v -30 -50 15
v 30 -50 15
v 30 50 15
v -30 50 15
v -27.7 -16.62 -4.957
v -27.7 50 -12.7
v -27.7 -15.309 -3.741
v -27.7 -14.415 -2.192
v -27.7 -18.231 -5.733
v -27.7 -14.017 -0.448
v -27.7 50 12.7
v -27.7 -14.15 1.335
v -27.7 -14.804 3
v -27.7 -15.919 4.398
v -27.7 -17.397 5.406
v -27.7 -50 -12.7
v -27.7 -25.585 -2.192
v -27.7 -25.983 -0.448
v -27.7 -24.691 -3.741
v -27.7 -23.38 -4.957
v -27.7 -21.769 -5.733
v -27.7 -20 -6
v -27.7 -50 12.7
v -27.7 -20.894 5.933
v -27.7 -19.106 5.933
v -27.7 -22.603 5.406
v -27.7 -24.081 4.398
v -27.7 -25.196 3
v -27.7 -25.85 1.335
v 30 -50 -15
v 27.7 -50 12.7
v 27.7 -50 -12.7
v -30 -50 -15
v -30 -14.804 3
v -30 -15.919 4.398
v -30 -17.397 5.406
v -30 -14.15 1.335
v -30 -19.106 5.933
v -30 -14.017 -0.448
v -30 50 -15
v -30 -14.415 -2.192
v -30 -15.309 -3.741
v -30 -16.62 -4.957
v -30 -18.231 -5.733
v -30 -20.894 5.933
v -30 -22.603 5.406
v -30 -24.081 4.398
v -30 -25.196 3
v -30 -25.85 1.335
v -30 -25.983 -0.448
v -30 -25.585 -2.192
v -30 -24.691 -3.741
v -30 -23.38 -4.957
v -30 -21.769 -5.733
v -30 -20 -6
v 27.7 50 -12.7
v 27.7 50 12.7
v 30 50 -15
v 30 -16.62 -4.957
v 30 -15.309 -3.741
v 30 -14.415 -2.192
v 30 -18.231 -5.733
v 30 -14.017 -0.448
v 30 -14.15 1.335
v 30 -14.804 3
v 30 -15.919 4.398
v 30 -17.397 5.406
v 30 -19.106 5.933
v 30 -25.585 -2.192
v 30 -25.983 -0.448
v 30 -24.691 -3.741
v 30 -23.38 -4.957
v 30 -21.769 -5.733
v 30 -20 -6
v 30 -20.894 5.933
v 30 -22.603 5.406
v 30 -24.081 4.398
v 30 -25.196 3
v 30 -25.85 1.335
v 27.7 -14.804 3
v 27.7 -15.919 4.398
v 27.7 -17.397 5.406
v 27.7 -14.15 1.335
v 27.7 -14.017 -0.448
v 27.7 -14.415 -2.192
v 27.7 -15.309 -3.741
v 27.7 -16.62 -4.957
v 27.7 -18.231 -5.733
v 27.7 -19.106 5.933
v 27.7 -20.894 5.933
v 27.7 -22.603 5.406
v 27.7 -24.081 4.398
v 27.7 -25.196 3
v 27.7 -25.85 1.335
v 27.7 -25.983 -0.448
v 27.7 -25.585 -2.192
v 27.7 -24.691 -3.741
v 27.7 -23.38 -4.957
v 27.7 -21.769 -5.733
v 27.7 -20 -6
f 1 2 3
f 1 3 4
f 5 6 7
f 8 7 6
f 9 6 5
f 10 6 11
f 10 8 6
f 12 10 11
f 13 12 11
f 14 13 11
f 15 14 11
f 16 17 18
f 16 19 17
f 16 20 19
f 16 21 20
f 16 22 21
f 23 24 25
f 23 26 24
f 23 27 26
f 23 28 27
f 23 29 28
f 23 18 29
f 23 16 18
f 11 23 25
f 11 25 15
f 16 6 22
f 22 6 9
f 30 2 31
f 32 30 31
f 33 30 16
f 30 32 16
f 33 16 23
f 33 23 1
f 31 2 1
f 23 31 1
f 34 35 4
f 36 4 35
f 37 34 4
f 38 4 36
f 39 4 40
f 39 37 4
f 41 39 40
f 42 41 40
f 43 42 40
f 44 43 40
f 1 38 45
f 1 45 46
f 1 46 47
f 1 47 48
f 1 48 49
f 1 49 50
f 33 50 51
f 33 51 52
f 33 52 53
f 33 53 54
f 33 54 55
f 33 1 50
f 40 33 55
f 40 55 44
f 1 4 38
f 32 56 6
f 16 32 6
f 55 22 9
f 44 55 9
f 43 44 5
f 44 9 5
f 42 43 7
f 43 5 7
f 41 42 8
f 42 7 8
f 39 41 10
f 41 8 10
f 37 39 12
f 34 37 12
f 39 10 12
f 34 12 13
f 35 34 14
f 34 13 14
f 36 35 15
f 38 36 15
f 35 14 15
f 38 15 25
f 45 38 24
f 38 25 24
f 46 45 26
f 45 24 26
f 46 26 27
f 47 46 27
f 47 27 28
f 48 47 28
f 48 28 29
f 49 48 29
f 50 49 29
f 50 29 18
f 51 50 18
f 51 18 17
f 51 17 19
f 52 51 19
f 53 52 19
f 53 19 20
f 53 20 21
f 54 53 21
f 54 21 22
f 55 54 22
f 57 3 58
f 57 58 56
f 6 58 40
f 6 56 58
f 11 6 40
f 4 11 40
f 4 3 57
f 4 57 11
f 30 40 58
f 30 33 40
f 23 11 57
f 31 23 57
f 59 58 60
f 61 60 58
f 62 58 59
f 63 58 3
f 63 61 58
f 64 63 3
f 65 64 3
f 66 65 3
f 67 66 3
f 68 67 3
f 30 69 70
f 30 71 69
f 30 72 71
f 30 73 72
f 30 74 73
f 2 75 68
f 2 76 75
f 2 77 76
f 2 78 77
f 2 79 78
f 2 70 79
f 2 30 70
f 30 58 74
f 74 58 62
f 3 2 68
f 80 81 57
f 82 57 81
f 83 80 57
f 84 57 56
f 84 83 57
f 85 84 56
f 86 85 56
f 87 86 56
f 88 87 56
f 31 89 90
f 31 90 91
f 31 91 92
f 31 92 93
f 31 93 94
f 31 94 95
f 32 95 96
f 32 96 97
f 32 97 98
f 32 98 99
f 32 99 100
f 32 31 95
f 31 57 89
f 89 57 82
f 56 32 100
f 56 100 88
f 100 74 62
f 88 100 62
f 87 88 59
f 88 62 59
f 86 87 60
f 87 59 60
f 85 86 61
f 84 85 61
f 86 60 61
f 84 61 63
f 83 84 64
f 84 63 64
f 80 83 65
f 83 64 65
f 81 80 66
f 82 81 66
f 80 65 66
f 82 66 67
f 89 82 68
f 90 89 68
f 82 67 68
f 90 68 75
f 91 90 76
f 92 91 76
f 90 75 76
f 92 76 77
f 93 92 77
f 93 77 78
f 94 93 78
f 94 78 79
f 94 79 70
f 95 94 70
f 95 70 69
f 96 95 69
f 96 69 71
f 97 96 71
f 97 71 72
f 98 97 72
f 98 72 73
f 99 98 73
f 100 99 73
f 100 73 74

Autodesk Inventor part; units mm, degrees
ref_plane "YZ Plane" through (0, 0, 0) normal (1, 0, 0) x (0, 1, 0)
ref_plane "XZ Plane" through (0, 0, 0) normal (0, 1, 0) x (-1, 0, 0)
ref_plane "XY Plane" through (0, 0, 0) normal (0, 0, 1) x (1, 0, 0)
sketch "スケッチ2" plane through (0, 0, 0) normal (0, 1, 0) x (-1, 0, 0)
  line L0 (-30, 15) -> (30, 15)
  line L1 (30, 15) -> (30, -15)
  line L2 (30, -15) -> (-30, -15)
  line L3 (-30, -15) -> (-30, 15)
  line L4 (-30, 15) -> (30, -15) construction
  line L5 (30, 15) -> (-30, -15) construction
  line L6 (27.7, -12.7) -> (27.7, 12.7)
  line L7 (27.7, 12.7) -> (-27.7, 12.7)
  line L8 (-27.7, 12.7) -> (-27.7, -12.7)
  line L9 (-27.7, -12.7) -> (27.7, -12.7)
  point P0 (0, 0)
  dimension "d0" = 60
  dimension "d1" = 30
  dimension "d2" = 2.3
extrude "押し出し1" add sketch "スケッチ2" along normal mid plane 100
sketch "スケッチ3" plane through (30, -50, -15) normal (1, 0, 0) x (0, 0, -1)
  circle A0 centre (-15, 30) radius 6
  point P0 (-15, 50)
  dimension "d5" = 12
  dimension "d6" = 20
extrude "押し出し2" cut sketch "スケッチ3" against normal blind 60
properties part number "車軸受け1"
